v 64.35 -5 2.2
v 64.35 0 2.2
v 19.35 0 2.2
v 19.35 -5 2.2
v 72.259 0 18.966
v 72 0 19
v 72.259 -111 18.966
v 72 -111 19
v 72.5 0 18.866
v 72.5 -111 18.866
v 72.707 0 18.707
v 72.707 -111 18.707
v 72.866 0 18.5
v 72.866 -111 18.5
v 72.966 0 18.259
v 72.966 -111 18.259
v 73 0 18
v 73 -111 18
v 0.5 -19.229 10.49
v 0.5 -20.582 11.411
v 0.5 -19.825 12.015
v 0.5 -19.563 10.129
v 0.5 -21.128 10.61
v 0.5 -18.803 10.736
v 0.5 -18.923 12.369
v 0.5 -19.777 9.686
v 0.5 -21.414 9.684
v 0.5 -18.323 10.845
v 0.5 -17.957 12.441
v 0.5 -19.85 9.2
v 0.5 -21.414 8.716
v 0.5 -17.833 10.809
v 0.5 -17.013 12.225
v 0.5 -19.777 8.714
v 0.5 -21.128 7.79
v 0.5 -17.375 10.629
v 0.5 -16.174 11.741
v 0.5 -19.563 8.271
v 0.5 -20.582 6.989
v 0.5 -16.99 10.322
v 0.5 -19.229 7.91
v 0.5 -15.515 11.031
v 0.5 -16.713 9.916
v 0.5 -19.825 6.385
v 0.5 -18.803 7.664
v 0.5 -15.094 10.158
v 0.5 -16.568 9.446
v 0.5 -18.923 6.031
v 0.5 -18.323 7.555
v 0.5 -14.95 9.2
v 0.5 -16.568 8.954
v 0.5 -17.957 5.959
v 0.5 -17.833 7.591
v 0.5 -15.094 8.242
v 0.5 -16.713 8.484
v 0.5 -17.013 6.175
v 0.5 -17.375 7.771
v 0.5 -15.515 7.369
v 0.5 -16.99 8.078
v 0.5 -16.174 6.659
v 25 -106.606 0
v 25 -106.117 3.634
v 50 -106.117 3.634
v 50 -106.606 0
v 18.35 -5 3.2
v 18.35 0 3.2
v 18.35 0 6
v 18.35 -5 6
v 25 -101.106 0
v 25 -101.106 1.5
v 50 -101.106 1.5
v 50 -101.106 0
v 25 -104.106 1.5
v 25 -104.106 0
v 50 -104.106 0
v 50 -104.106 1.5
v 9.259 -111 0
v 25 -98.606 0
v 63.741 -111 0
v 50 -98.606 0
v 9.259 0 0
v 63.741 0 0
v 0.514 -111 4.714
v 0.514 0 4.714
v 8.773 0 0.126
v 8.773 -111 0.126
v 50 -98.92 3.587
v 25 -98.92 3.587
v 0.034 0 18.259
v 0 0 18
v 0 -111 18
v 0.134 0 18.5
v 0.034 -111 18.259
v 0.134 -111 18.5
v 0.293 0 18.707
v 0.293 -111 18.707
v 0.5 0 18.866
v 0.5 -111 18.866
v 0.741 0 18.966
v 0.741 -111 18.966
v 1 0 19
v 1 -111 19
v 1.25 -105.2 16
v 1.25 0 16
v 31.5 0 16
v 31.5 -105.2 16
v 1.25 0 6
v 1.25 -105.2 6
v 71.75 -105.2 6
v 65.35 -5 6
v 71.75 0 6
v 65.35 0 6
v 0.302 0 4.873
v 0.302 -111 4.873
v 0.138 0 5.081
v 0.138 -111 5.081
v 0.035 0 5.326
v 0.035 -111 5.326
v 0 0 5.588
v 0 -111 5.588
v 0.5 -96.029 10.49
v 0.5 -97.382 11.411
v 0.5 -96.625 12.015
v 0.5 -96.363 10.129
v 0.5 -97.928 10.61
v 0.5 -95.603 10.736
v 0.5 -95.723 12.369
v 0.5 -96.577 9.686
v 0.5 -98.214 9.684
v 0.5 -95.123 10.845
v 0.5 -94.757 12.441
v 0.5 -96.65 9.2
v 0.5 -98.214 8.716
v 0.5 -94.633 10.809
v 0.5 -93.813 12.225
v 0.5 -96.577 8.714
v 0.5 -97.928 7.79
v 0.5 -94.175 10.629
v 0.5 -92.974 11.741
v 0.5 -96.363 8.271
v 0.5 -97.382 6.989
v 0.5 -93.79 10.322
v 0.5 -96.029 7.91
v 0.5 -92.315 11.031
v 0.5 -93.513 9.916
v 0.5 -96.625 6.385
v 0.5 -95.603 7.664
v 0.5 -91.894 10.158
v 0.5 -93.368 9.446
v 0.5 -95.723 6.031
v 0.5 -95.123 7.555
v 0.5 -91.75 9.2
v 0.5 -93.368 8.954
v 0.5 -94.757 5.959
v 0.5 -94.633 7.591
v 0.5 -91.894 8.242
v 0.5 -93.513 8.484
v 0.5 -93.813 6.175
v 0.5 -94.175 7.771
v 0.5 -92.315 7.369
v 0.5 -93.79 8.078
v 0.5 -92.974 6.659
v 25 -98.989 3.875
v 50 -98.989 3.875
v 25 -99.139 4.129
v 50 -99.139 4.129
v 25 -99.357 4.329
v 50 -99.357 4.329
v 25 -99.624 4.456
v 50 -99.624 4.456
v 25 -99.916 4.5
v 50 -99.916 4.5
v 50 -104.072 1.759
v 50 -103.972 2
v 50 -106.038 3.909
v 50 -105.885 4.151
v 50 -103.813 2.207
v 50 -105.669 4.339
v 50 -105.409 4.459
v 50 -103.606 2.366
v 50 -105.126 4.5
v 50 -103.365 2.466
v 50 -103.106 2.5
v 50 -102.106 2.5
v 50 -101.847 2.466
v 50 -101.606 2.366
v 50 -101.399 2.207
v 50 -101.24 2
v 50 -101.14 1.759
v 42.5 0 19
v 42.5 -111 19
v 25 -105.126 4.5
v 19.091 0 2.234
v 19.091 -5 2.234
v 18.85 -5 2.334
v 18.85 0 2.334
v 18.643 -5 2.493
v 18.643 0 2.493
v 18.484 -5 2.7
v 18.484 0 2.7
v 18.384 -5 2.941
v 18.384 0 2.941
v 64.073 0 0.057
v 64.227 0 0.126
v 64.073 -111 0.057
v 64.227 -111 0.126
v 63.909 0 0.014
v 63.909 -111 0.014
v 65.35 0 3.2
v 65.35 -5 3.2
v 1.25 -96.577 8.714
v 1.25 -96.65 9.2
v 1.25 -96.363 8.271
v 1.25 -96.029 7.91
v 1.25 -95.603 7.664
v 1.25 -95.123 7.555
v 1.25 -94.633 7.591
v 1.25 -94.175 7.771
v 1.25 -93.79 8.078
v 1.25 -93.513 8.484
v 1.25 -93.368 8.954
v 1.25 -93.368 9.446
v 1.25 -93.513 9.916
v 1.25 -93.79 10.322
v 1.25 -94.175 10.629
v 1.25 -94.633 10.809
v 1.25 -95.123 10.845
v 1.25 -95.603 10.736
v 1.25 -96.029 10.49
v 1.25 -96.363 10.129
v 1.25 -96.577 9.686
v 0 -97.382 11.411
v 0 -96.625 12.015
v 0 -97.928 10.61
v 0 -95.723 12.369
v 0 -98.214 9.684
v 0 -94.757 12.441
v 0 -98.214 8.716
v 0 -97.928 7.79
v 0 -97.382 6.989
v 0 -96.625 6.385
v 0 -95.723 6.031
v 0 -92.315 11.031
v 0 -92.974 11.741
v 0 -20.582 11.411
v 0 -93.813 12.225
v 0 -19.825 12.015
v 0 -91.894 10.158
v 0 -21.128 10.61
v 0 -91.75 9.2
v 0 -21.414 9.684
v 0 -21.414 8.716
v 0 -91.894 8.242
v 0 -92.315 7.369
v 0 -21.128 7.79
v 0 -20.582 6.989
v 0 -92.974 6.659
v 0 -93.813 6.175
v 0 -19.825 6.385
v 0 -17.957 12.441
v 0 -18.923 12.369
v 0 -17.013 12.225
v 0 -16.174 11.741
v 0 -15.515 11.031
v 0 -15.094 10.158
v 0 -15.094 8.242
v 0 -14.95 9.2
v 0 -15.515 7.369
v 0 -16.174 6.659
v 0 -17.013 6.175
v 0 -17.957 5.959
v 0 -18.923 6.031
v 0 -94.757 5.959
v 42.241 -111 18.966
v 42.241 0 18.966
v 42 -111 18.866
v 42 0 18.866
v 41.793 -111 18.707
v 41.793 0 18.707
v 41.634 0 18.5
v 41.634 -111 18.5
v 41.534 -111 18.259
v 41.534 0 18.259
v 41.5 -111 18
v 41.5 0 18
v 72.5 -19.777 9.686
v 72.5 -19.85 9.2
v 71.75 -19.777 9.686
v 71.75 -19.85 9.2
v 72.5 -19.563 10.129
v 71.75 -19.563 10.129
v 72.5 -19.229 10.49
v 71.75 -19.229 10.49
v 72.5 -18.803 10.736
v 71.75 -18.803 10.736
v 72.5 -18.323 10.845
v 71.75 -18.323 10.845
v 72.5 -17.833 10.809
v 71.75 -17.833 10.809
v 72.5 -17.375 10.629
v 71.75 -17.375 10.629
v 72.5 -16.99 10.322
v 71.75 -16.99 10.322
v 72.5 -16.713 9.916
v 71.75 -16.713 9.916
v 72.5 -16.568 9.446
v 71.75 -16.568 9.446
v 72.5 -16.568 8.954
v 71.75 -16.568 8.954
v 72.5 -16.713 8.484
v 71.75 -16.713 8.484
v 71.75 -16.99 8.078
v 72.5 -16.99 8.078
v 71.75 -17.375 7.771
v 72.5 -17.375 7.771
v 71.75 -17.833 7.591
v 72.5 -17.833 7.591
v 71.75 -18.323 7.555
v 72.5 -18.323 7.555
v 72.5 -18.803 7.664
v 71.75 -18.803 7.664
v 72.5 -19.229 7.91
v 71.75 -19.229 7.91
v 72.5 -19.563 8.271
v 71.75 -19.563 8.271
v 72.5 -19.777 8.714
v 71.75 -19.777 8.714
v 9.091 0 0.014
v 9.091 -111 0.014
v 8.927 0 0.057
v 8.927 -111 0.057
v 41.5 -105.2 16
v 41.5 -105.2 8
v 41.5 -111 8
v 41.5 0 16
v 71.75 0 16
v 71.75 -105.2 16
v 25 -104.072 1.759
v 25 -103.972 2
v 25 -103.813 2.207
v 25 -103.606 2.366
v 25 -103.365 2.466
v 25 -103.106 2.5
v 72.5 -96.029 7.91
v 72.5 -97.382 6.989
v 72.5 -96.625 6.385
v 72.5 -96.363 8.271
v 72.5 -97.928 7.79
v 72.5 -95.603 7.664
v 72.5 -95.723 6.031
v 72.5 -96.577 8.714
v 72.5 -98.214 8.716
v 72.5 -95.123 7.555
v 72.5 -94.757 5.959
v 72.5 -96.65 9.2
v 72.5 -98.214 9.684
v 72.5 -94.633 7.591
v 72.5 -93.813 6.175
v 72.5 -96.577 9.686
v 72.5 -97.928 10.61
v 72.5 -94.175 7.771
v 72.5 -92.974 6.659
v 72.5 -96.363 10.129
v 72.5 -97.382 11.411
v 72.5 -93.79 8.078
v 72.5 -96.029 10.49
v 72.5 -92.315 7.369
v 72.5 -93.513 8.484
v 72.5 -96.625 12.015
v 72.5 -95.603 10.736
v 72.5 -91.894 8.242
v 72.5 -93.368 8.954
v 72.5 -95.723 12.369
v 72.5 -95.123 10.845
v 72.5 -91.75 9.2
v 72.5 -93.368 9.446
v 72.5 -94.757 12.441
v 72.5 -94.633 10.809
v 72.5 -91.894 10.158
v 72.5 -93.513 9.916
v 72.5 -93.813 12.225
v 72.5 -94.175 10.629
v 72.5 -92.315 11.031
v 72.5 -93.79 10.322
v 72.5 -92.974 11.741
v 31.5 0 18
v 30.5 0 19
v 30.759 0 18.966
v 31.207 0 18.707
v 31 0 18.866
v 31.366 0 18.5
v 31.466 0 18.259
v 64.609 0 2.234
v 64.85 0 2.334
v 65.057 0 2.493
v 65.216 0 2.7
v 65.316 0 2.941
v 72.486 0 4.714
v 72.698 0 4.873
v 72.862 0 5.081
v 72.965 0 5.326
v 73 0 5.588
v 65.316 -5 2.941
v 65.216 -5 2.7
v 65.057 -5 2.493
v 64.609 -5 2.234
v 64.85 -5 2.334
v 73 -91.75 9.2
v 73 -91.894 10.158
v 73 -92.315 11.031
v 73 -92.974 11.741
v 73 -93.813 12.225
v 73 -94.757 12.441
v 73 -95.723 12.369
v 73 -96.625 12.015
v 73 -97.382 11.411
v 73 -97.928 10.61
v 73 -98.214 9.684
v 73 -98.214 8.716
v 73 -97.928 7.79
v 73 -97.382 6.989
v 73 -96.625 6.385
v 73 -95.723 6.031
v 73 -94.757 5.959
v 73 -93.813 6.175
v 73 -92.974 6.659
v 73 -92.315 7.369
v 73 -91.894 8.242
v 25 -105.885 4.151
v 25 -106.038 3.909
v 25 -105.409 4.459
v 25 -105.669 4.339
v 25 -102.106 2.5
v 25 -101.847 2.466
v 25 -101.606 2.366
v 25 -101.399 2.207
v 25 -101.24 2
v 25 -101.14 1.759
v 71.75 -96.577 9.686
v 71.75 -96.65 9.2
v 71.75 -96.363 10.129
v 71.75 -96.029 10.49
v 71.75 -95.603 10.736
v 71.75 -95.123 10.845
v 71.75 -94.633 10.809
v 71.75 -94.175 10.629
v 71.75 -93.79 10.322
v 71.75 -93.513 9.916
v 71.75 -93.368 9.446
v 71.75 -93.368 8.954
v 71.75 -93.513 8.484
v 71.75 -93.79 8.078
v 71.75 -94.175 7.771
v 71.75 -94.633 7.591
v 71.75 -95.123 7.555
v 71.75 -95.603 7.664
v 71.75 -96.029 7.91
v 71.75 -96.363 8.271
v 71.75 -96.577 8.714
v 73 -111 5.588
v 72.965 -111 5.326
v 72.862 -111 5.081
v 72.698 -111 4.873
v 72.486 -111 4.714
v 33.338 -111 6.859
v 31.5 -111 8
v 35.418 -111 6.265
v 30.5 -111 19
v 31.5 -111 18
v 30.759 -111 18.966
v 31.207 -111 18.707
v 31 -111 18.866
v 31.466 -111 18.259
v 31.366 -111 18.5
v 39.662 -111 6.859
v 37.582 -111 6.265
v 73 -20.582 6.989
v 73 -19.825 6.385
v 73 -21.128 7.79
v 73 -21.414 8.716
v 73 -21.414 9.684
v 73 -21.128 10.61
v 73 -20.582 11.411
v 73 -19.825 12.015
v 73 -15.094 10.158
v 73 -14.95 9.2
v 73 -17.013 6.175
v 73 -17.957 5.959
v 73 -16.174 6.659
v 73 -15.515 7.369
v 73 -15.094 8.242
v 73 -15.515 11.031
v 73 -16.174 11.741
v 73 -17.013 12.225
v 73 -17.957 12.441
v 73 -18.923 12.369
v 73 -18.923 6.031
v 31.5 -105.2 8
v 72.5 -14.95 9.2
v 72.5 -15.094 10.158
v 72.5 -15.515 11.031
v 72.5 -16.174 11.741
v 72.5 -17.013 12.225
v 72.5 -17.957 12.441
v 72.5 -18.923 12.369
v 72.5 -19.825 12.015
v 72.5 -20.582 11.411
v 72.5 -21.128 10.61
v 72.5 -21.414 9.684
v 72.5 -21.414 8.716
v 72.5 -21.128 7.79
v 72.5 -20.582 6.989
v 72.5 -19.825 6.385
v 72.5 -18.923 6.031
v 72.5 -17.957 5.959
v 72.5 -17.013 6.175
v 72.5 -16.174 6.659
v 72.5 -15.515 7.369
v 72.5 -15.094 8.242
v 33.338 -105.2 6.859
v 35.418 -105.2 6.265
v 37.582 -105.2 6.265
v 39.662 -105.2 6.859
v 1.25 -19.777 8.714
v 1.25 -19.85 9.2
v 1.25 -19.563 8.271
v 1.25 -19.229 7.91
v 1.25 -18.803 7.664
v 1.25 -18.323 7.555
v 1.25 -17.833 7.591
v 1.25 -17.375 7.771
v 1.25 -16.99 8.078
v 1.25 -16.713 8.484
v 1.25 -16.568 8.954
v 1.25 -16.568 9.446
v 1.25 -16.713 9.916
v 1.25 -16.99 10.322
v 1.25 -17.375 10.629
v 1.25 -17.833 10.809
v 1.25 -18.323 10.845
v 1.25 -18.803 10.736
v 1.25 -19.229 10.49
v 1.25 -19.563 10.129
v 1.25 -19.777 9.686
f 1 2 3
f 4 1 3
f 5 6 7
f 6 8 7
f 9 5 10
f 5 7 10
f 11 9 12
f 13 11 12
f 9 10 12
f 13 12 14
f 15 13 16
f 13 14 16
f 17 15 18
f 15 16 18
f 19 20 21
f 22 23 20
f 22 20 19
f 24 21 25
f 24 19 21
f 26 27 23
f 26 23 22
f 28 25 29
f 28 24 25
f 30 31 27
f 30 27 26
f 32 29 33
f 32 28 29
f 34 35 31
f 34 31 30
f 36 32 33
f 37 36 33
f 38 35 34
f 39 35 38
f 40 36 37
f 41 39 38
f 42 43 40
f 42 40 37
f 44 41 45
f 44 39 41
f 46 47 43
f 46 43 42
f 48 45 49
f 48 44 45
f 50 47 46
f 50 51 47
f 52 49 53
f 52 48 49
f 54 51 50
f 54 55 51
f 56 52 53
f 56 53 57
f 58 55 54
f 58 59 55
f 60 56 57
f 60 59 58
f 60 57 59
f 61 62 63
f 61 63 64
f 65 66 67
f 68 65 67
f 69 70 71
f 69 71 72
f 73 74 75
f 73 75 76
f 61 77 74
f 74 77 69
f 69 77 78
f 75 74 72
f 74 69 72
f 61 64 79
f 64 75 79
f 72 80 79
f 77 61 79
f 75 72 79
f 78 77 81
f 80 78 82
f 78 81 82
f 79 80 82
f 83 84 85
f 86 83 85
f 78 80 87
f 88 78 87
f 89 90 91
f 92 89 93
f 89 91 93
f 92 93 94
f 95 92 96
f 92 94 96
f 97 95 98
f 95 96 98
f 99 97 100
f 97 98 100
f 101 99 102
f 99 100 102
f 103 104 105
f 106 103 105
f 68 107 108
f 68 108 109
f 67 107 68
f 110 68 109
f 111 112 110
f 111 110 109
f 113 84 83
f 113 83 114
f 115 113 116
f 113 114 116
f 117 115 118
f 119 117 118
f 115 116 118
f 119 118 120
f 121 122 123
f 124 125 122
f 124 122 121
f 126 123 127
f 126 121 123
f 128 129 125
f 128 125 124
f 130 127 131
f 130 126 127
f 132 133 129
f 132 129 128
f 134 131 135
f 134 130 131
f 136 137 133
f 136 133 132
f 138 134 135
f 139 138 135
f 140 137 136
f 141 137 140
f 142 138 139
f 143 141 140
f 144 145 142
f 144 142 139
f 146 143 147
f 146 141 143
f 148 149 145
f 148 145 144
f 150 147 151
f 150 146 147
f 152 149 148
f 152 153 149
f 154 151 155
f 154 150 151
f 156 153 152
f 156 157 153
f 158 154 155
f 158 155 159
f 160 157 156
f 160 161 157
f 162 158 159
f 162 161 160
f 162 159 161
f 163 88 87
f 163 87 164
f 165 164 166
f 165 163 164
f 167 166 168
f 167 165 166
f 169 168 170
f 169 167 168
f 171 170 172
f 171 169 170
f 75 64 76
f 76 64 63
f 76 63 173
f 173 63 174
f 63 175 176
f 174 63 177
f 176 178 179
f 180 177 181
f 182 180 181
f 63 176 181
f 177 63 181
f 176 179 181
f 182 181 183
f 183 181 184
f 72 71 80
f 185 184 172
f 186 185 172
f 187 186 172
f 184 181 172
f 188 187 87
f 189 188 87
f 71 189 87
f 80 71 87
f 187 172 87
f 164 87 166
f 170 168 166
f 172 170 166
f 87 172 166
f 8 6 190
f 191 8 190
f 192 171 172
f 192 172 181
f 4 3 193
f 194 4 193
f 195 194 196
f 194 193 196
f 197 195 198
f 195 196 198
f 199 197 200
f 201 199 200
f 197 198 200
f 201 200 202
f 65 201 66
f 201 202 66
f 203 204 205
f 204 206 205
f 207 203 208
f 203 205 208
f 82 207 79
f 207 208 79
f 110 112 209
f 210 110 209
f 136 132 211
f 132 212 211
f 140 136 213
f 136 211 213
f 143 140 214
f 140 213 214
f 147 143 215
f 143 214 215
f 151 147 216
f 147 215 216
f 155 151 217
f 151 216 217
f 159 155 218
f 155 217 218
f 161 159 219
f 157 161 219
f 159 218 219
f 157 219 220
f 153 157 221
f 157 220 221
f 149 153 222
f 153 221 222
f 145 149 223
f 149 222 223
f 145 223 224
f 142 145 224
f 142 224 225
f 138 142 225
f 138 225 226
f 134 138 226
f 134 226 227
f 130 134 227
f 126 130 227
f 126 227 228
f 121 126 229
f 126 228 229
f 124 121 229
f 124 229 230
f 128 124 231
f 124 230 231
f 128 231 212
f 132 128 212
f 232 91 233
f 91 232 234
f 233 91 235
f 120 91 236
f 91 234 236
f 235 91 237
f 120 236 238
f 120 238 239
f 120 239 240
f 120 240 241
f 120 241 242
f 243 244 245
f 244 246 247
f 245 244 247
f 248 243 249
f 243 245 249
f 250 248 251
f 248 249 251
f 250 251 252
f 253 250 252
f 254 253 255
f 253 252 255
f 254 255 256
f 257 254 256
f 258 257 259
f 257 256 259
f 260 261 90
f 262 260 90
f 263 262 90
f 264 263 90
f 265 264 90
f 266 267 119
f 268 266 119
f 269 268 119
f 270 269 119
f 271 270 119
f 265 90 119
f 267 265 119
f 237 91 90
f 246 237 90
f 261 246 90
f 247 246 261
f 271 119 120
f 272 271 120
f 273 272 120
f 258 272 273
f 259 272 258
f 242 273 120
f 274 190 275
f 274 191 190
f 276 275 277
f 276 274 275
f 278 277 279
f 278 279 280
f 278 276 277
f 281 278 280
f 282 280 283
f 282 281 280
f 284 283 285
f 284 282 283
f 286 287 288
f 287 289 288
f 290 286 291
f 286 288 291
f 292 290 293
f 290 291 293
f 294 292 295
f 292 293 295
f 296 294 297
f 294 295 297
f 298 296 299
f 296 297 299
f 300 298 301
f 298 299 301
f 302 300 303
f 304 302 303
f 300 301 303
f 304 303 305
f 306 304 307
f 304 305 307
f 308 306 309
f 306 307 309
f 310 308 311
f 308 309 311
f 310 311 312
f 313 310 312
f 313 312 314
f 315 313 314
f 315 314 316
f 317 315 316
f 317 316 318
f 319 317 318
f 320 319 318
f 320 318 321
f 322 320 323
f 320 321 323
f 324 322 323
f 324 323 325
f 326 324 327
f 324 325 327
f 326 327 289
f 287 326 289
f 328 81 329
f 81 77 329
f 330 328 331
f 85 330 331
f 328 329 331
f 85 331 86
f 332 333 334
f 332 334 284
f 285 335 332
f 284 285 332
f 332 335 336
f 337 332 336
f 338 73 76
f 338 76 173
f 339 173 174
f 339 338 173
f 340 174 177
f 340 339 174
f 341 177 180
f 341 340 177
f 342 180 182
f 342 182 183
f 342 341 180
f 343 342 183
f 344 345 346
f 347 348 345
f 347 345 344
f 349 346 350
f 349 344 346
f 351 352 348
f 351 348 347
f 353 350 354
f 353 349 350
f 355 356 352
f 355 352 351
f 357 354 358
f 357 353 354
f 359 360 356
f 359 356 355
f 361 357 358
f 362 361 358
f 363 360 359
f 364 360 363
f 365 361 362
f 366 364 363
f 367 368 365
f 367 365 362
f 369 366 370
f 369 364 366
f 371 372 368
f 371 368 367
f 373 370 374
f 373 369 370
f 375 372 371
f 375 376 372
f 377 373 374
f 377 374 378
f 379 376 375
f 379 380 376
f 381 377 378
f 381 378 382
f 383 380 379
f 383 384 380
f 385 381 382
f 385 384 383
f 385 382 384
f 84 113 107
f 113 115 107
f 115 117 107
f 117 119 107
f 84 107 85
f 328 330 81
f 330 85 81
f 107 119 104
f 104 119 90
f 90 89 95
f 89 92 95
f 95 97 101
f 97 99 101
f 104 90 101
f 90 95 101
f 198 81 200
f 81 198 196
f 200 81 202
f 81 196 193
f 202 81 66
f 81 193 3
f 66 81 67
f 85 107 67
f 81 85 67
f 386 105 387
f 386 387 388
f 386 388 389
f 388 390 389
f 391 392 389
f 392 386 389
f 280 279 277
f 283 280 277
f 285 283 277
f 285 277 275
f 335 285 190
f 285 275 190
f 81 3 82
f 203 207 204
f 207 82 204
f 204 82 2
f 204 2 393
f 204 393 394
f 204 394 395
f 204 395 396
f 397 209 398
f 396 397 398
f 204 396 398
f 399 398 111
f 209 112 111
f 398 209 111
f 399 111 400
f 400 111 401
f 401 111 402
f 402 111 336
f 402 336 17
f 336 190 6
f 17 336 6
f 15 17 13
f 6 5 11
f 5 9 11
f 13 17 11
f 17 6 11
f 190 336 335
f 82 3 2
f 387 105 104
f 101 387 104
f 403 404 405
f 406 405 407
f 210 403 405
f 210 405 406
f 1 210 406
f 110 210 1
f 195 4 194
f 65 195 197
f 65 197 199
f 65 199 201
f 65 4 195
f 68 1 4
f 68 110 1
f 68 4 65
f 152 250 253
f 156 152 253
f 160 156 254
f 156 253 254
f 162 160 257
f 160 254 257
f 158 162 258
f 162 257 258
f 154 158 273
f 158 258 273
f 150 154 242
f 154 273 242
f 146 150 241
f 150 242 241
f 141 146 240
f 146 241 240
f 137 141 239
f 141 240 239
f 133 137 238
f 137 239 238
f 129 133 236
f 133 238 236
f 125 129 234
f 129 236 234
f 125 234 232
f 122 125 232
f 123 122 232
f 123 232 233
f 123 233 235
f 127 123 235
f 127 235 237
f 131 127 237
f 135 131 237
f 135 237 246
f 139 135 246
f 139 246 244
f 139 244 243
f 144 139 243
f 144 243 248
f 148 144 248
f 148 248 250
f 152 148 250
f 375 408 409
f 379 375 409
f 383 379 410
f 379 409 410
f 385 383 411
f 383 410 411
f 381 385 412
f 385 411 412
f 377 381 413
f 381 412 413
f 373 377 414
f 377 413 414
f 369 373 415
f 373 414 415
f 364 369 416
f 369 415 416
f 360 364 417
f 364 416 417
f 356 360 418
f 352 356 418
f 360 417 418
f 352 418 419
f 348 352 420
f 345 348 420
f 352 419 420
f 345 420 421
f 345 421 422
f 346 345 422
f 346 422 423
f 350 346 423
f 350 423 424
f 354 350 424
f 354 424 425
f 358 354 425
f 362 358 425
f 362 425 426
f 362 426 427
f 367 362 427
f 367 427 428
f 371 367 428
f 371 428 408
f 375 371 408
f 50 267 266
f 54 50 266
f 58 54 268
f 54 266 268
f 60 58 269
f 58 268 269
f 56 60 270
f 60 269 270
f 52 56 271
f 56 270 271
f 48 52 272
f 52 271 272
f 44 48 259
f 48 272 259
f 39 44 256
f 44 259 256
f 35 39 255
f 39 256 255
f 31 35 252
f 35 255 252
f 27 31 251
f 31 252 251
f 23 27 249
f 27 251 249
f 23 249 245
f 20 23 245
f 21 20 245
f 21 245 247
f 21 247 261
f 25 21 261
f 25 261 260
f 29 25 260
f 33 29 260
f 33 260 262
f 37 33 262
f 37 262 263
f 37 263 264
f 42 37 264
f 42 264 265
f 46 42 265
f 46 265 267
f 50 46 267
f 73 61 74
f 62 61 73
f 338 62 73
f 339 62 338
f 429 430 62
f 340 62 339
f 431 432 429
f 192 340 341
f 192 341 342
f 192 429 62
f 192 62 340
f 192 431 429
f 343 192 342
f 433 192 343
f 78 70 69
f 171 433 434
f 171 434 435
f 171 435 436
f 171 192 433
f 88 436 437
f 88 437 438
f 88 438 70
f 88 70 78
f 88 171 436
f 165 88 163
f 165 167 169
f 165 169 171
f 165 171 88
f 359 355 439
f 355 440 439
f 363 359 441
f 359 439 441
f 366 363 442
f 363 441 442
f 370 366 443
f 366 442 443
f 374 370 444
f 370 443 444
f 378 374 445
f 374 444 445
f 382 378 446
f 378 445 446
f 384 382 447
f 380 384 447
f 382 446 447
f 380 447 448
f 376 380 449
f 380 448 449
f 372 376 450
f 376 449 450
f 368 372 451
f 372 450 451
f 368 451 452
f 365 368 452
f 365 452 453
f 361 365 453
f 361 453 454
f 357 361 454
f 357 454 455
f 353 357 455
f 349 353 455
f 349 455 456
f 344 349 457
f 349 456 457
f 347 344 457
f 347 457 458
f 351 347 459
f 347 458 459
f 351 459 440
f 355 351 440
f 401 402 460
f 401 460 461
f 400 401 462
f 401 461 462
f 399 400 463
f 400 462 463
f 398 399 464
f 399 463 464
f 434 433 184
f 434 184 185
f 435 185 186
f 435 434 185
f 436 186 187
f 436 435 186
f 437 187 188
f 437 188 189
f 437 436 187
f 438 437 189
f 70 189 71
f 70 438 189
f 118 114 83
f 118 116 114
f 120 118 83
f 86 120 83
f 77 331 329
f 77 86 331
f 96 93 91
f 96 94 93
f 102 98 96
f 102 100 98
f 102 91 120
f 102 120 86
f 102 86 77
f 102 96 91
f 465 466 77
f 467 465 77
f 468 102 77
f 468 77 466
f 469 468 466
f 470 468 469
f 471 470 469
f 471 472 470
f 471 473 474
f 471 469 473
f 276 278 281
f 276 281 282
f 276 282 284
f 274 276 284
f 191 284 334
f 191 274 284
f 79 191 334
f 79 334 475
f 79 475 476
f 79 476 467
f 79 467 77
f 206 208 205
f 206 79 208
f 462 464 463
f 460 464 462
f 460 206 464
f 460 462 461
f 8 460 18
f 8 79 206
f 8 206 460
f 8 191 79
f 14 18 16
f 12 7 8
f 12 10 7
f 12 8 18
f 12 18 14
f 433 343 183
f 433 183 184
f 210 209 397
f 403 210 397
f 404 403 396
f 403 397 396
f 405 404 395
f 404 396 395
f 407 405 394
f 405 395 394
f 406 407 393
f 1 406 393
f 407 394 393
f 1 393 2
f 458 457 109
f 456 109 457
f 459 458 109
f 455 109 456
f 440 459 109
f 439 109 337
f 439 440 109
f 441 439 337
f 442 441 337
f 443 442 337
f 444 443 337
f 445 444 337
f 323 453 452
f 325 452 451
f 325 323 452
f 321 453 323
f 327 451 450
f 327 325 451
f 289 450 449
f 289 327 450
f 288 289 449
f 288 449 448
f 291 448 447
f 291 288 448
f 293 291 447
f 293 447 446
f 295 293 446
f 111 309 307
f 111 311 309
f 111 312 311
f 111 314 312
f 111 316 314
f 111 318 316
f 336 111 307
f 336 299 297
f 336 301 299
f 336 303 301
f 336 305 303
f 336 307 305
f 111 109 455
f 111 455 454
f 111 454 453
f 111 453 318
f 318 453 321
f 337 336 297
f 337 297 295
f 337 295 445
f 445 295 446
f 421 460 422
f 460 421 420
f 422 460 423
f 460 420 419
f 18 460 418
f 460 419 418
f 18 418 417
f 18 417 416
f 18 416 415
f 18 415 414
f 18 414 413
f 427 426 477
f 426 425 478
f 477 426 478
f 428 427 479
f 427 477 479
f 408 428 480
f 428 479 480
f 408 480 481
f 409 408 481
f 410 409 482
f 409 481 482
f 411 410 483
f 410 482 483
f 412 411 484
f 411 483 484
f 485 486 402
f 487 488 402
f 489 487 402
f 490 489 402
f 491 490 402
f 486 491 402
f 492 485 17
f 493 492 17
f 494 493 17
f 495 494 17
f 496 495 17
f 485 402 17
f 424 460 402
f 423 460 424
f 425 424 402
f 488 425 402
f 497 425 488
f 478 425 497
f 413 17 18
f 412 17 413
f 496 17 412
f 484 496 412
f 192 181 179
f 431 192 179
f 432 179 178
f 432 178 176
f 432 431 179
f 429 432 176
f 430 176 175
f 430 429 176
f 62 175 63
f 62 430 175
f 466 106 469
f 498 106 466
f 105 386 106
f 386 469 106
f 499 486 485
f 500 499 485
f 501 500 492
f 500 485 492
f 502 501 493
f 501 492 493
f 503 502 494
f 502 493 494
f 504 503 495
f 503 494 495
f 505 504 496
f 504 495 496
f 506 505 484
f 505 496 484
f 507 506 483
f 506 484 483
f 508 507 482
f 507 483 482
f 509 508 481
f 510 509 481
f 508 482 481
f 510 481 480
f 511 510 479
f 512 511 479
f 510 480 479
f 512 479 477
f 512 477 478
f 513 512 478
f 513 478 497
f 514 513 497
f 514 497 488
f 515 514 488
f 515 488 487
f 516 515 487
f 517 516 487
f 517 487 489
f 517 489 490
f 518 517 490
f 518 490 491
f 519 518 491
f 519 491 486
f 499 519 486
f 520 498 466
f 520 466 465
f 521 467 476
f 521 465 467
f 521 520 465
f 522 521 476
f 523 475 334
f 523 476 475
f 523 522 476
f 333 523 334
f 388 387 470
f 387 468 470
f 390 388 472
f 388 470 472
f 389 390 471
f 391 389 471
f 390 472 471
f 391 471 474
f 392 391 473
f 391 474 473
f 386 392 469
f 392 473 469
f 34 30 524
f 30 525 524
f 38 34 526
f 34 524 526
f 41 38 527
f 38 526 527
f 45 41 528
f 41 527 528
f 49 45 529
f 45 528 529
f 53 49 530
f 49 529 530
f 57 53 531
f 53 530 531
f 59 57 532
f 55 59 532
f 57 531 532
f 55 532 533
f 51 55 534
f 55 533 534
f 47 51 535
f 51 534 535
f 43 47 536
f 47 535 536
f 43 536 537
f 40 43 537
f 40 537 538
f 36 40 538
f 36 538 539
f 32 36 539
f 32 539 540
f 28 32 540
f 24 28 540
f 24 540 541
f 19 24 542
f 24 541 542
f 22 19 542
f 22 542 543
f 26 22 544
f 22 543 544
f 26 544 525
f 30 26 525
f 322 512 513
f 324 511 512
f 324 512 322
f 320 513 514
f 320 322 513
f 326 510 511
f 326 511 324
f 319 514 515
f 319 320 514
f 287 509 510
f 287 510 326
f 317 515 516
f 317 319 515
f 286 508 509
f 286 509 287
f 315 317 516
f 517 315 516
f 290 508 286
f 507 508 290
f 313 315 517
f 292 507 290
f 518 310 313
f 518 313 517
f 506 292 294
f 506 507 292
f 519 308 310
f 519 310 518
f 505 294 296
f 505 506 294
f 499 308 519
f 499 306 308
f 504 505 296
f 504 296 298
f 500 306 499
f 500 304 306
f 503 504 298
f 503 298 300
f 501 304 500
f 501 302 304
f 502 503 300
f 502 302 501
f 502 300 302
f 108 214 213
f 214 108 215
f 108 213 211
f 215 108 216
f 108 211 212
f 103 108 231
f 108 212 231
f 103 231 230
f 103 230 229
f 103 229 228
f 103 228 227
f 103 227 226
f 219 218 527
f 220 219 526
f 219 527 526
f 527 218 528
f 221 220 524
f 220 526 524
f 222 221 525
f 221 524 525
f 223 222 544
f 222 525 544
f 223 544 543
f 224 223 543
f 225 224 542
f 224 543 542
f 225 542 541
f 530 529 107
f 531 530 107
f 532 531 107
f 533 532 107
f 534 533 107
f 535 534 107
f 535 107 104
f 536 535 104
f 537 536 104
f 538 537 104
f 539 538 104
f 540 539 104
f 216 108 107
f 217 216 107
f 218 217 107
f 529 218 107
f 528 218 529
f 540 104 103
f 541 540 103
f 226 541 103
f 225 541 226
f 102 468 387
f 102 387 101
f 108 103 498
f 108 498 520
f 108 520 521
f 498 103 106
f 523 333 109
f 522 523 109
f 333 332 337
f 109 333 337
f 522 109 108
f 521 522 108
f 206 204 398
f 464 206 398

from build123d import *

# Parameters (mm, degrees)
F1_DEPTH       = 111
F2_W           = 70.5
F2_H           = 10
F3_DEPTH       = 105.2
F5_DEPTH       = 150
F7_D           = 3.3
F7_DEPTH       = 5
F7_CBORE_D     = 6.5
F7_CBORE_DEPTH = 0.5
F7_TIP         = 0.9914200214
F9_D           = 3.3
F9_DEPTH       = 5
F9_CBORE_D     = 6.5
F9_CBORE_DEPTH = 0.5
F9_TIP         = 0.9914200214
F11_START      = 25
F11_DEPTH      = 25
F12_R          = 1
F14_DEPTH      = 5


with BuildPart() as f1:
    # F0 (on Front) → F1 (new body)
    with BuildSketch(Plane.XZ):
        Polygon((73, 19), (0, 19), (0, 5), (9, 0), (64, 0), (73, 5), align=None)
    extrude(amount=F1_DEPTH)

    # F2 (on Front) → F3 (cut)
    with BuildSketch(Plane.XZ):
        with Locations((36.5, 11)):
            Rectangle(F2_W, F2_H)
    extrude(amount=F3_DEPTH, mode=Mode.SUBTRACT)

    # F4 (on Front) → F5 (cut)
    with BuildSketch(Plane.XZ):
        with BuildLine():
            Line((41.5, 19), (31.5, 19))
            Line((31.5, 19), (31.5, 8))
            ThreePointArc((31.5, 8), (36.5, 6.1897503241), (41.5, 8))
            Line((41.5, 8), (41.5, 19))
        make_face()
    extrude(amount=F5_DEPTH, mode=Mode.SUBTRACT)

    # F7
    with Locations(Plane(origin=(0, 0, 0), x_dir=(0, 1, 0), z_dir=(-1, 0, 0))):
        with Locations((-95, -9.2), (-18.2, -9.2)):
            CounterBoreHole(F7_D / 2, F7_CBORE_D / 2, F7_CBORE_DEPTH, depth=F7_DEPTH)
            with Locations((0, 0, -(F7_DEPTH + F7_TIP / 2))):  # 118° drill point
                Cone(0, F7_D / 2, F7_TIP, mode=Mode.SUBTRACT)

    # F9
    with Locations(Plane.YZ.offset(73)):
        with Locations((-95, 9.2), (-18.2, 9.2)):
            CounterBoreHole(F9_D / 2, F9_CBORE_D / 2, F9_CBORE_DEPTH, depth=F9_DEPTH)
            with Locations((0, 0, -(F9_DEPTH + F9_TIP / 2))):  # 118° drill point
                Cone(0, F9_D / 2, F9_TIP, mode=Mode.SUBTRACT)

    # F10 (on Right) → F11 (cut)
    with BuildSketch(Plane.YZ.offset(F11_START)):
        with BuildLine():
            Line((-99.916331174, 4.5), (-105.1256978151, 4.5))
            ThreePointArc((-105.1256978151, 4.5), (-105.7839048332, 4.2528369819), (-106.1167429851, 3.6335270426))
            Line((-106.1167429851, 3.6335270426), (-106.6063010141, 0))
            Line((-106.6063010141, 0), (-104.1063010141, 0))
            Line((-104.1063010141, 0), (-104.1063010141, 1.5))
            ThreePointArc((-104.1063010141, 1.5), (-103.8134077953, 2.2071067812), (-103.1063010141, 2.5))
            Line((-103.1063010141, 2.5), (-102.1063010141, 2.5))
            ThreePointArc((-102.1063010141, 2.5), (-101.3991942329, 2.2071067812), (-101.1063010141, 1.5))
            Line((-101.1063010141, 1.5), (-101.1063010141, 0))
            Line((-101.1063010141, 0), (-98.6063010141, 0))
            Line((-98.6063010141, 0), (-98.9201364759, 3.5871557427))
            ThreePointArc((-98.9201364759, 3.5871557427), (-99.2407409664, 4.2372773368), (-99.916331174, 4.5))
        make_face()
    extrude(amount=F11_DEPTH, mode=Mode.SUBTRACT)

    # F12
    f12_edges = [f1.edges().sort_by_distance(p)[0] for p in [
        (73, -55.5, 19),
        (0, -55.5, 19),
        (31.5, -55.5, 19),
        (41.5, -55.5, 19),
        (9, -55.5, 0),
        (64, -55.5, 0),
        (73, -55.5, 5),
        (0, -55.5, 5),
    ]]
    fillet(f12_edges, radius=F12_R)

    # F13 (on face) → F14 (cut)
    with BuildSketch(Plane(origin=(0, 0, 0), x_dir=(-1, 0, 0), z_dir=(0, 1, 0))):
        with BuildLine():
            Line((-18.35, 6), (-65.35, 6))
            Line((-65.35, 6), (-65.35, 3.2))
            ThreePointArc((-65.35, 3.2), (-65.0571067812, 2.4928932188), (-64.35, 2.2))
            Line((-64.35, 2.2), (-19.35, 2.2))
            ThreePointArc((-19.35, 2.2), (-18.6428932188, 2.4928932188), (-18.35, 3.2))
            Line((-18.35, 3.2), (-18.35, 6))
        make_face()
    extrude(amount=-F14_DEPTH, mode=Mode.SUBTRACT)


solid = f1.part
